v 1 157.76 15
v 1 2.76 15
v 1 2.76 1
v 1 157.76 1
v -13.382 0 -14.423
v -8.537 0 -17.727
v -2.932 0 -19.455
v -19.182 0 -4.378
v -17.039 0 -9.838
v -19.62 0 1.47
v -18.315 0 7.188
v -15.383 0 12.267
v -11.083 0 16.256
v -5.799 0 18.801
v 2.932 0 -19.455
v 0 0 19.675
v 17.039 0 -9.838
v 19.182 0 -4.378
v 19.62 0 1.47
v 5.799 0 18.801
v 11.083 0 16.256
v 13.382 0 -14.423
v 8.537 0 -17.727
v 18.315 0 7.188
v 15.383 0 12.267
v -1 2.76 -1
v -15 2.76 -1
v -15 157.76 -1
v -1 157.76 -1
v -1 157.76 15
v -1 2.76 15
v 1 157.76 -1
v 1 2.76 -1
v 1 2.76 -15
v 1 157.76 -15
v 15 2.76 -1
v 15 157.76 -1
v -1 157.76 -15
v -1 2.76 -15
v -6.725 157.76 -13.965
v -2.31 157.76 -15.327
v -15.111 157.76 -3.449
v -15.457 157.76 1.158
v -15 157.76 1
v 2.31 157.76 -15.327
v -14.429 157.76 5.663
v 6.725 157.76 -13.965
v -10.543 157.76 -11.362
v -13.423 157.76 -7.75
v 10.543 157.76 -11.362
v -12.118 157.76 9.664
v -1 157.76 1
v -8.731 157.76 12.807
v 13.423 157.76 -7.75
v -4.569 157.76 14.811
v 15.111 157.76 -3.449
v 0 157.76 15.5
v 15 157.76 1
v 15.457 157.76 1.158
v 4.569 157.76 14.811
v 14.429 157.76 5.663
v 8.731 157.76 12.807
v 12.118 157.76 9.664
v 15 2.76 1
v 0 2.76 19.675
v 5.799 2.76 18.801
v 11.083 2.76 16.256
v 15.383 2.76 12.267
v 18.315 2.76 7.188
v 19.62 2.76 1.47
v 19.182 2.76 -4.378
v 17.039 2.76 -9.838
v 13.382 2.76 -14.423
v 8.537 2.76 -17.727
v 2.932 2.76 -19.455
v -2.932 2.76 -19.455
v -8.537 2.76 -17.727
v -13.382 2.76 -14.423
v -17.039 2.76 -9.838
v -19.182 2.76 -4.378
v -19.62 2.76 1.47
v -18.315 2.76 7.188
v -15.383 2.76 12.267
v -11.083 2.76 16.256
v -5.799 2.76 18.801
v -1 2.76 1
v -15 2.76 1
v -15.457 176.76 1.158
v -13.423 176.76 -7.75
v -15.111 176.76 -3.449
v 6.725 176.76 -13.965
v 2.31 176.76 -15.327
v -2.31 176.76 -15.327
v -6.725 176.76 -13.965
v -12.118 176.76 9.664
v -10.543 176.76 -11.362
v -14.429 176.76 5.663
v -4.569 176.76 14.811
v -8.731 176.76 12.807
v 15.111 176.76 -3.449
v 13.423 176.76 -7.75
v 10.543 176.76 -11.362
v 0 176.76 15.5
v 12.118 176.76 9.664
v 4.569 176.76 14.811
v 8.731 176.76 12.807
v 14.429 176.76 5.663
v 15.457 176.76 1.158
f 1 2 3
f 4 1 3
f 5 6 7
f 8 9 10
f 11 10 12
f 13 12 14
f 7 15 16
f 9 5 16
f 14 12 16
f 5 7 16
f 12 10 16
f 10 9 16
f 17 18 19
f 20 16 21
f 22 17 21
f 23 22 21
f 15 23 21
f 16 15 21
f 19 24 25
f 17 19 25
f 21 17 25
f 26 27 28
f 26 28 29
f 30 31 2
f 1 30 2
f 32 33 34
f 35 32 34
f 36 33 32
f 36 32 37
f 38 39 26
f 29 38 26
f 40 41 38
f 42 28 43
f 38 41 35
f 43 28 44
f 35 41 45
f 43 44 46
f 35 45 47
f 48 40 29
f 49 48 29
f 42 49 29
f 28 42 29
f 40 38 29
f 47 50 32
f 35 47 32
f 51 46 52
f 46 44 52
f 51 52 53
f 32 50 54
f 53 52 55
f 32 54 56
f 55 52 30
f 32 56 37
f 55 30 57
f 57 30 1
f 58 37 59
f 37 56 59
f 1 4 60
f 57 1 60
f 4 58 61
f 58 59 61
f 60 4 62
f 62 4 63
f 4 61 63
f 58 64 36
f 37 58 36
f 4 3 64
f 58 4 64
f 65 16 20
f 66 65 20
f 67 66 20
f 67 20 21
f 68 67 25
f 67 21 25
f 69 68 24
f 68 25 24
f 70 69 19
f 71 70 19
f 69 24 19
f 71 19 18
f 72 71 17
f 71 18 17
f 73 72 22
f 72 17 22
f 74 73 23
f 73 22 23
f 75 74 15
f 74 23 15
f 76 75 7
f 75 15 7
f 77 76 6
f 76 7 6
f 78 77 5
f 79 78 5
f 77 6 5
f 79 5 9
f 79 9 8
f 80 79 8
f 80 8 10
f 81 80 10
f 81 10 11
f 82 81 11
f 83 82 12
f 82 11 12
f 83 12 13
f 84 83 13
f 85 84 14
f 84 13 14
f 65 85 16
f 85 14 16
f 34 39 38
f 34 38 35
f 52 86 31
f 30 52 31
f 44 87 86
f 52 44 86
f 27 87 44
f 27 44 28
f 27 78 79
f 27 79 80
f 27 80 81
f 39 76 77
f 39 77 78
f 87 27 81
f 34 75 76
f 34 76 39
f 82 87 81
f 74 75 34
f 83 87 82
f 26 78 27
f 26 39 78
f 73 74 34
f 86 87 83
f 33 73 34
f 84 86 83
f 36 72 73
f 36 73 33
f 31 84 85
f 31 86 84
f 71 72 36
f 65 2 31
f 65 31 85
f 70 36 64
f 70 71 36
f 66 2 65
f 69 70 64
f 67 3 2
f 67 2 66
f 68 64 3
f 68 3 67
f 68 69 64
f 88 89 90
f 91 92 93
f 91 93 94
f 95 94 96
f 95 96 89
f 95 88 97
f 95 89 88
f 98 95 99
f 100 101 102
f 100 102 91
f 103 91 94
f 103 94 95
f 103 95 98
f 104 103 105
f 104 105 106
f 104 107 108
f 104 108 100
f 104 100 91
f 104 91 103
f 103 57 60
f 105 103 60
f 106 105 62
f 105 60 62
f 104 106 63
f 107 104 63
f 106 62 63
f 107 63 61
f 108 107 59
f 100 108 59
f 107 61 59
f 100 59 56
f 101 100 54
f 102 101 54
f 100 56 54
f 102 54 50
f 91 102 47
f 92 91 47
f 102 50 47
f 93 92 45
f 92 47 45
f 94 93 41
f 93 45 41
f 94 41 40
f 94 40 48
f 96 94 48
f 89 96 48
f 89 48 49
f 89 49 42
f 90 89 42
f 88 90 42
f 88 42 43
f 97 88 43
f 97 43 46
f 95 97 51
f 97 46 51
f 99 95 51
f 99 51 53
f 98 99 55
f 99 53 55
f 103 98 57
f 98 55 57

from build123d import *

# Parameters (mm, degrees)
SKETCH1_R           = 19.675
BOSS_EXTRUDE1_DEPTH = 2.76
SKETCH2_W           = 2
SKETCH2_H           = 14
SKETCH2_W_2         = 14
SKETCH2_H_2         = 2
BOSS_EXTRUDE2_DEPTH = 155
SKETCH3_R           = 15.5
BOSS_EXTRUDE3_DEPTH = 19


with BuildPart() as part:
    # Sketch1 → Boss-Extrude1 (new body)
    with BuildSketch(Plane(origin=(0, 0, 0), x_dir=(1, 0, 0), z_dir=(0, 1, 0))):
        with Locations(Location((0, 0, 0), (0, 0, 270))):
            Circle(SKETCH1_R)
    extrude(amount=BOSS_EXTRUDE1_DEPTH)

    # Sketch2 → Boss-Extrude2 (add)
    with BuildSketch(Plane(origin=(0, 2.76, 0), x_dir=(1, 0, 0), z_dir=(0, 1, 0))):
        with Locations((0, 8)):
            Rectangle(SKETCH2_W, SKETCH2_H)
        with Locations((8, 0)):
            Rectangle(SKETCH2_W_2, SKETCH2_H_2)
        Rectangle(SKETCH2_W, SKETCH2_H_2)
        with Locations((0, -8)):
            Rectangle(SKETCH2_W, SKETCH2_H)
        with Locations((-8, 0)):
            Rectangle(SKETCH2_W_2, SKETCH2_H_2)
    extrude(amount=BOSS_EXTRUDE2_DEPTH)

    # Sketch3 → Boss-Extrude3 (add)
    with BuildSketch(Plane(origin=(0, 157.76, 0), x_dir=(1, 0, 0), z_dir=(0, 1, 0))):
        with Locations(Location((0, 0, 0), (0, 0, 270))):
            Circle(SKETCH3_R)
    extrude(amount=BOSS_EXTRUDE3_DEPTH)


solid = part.part
